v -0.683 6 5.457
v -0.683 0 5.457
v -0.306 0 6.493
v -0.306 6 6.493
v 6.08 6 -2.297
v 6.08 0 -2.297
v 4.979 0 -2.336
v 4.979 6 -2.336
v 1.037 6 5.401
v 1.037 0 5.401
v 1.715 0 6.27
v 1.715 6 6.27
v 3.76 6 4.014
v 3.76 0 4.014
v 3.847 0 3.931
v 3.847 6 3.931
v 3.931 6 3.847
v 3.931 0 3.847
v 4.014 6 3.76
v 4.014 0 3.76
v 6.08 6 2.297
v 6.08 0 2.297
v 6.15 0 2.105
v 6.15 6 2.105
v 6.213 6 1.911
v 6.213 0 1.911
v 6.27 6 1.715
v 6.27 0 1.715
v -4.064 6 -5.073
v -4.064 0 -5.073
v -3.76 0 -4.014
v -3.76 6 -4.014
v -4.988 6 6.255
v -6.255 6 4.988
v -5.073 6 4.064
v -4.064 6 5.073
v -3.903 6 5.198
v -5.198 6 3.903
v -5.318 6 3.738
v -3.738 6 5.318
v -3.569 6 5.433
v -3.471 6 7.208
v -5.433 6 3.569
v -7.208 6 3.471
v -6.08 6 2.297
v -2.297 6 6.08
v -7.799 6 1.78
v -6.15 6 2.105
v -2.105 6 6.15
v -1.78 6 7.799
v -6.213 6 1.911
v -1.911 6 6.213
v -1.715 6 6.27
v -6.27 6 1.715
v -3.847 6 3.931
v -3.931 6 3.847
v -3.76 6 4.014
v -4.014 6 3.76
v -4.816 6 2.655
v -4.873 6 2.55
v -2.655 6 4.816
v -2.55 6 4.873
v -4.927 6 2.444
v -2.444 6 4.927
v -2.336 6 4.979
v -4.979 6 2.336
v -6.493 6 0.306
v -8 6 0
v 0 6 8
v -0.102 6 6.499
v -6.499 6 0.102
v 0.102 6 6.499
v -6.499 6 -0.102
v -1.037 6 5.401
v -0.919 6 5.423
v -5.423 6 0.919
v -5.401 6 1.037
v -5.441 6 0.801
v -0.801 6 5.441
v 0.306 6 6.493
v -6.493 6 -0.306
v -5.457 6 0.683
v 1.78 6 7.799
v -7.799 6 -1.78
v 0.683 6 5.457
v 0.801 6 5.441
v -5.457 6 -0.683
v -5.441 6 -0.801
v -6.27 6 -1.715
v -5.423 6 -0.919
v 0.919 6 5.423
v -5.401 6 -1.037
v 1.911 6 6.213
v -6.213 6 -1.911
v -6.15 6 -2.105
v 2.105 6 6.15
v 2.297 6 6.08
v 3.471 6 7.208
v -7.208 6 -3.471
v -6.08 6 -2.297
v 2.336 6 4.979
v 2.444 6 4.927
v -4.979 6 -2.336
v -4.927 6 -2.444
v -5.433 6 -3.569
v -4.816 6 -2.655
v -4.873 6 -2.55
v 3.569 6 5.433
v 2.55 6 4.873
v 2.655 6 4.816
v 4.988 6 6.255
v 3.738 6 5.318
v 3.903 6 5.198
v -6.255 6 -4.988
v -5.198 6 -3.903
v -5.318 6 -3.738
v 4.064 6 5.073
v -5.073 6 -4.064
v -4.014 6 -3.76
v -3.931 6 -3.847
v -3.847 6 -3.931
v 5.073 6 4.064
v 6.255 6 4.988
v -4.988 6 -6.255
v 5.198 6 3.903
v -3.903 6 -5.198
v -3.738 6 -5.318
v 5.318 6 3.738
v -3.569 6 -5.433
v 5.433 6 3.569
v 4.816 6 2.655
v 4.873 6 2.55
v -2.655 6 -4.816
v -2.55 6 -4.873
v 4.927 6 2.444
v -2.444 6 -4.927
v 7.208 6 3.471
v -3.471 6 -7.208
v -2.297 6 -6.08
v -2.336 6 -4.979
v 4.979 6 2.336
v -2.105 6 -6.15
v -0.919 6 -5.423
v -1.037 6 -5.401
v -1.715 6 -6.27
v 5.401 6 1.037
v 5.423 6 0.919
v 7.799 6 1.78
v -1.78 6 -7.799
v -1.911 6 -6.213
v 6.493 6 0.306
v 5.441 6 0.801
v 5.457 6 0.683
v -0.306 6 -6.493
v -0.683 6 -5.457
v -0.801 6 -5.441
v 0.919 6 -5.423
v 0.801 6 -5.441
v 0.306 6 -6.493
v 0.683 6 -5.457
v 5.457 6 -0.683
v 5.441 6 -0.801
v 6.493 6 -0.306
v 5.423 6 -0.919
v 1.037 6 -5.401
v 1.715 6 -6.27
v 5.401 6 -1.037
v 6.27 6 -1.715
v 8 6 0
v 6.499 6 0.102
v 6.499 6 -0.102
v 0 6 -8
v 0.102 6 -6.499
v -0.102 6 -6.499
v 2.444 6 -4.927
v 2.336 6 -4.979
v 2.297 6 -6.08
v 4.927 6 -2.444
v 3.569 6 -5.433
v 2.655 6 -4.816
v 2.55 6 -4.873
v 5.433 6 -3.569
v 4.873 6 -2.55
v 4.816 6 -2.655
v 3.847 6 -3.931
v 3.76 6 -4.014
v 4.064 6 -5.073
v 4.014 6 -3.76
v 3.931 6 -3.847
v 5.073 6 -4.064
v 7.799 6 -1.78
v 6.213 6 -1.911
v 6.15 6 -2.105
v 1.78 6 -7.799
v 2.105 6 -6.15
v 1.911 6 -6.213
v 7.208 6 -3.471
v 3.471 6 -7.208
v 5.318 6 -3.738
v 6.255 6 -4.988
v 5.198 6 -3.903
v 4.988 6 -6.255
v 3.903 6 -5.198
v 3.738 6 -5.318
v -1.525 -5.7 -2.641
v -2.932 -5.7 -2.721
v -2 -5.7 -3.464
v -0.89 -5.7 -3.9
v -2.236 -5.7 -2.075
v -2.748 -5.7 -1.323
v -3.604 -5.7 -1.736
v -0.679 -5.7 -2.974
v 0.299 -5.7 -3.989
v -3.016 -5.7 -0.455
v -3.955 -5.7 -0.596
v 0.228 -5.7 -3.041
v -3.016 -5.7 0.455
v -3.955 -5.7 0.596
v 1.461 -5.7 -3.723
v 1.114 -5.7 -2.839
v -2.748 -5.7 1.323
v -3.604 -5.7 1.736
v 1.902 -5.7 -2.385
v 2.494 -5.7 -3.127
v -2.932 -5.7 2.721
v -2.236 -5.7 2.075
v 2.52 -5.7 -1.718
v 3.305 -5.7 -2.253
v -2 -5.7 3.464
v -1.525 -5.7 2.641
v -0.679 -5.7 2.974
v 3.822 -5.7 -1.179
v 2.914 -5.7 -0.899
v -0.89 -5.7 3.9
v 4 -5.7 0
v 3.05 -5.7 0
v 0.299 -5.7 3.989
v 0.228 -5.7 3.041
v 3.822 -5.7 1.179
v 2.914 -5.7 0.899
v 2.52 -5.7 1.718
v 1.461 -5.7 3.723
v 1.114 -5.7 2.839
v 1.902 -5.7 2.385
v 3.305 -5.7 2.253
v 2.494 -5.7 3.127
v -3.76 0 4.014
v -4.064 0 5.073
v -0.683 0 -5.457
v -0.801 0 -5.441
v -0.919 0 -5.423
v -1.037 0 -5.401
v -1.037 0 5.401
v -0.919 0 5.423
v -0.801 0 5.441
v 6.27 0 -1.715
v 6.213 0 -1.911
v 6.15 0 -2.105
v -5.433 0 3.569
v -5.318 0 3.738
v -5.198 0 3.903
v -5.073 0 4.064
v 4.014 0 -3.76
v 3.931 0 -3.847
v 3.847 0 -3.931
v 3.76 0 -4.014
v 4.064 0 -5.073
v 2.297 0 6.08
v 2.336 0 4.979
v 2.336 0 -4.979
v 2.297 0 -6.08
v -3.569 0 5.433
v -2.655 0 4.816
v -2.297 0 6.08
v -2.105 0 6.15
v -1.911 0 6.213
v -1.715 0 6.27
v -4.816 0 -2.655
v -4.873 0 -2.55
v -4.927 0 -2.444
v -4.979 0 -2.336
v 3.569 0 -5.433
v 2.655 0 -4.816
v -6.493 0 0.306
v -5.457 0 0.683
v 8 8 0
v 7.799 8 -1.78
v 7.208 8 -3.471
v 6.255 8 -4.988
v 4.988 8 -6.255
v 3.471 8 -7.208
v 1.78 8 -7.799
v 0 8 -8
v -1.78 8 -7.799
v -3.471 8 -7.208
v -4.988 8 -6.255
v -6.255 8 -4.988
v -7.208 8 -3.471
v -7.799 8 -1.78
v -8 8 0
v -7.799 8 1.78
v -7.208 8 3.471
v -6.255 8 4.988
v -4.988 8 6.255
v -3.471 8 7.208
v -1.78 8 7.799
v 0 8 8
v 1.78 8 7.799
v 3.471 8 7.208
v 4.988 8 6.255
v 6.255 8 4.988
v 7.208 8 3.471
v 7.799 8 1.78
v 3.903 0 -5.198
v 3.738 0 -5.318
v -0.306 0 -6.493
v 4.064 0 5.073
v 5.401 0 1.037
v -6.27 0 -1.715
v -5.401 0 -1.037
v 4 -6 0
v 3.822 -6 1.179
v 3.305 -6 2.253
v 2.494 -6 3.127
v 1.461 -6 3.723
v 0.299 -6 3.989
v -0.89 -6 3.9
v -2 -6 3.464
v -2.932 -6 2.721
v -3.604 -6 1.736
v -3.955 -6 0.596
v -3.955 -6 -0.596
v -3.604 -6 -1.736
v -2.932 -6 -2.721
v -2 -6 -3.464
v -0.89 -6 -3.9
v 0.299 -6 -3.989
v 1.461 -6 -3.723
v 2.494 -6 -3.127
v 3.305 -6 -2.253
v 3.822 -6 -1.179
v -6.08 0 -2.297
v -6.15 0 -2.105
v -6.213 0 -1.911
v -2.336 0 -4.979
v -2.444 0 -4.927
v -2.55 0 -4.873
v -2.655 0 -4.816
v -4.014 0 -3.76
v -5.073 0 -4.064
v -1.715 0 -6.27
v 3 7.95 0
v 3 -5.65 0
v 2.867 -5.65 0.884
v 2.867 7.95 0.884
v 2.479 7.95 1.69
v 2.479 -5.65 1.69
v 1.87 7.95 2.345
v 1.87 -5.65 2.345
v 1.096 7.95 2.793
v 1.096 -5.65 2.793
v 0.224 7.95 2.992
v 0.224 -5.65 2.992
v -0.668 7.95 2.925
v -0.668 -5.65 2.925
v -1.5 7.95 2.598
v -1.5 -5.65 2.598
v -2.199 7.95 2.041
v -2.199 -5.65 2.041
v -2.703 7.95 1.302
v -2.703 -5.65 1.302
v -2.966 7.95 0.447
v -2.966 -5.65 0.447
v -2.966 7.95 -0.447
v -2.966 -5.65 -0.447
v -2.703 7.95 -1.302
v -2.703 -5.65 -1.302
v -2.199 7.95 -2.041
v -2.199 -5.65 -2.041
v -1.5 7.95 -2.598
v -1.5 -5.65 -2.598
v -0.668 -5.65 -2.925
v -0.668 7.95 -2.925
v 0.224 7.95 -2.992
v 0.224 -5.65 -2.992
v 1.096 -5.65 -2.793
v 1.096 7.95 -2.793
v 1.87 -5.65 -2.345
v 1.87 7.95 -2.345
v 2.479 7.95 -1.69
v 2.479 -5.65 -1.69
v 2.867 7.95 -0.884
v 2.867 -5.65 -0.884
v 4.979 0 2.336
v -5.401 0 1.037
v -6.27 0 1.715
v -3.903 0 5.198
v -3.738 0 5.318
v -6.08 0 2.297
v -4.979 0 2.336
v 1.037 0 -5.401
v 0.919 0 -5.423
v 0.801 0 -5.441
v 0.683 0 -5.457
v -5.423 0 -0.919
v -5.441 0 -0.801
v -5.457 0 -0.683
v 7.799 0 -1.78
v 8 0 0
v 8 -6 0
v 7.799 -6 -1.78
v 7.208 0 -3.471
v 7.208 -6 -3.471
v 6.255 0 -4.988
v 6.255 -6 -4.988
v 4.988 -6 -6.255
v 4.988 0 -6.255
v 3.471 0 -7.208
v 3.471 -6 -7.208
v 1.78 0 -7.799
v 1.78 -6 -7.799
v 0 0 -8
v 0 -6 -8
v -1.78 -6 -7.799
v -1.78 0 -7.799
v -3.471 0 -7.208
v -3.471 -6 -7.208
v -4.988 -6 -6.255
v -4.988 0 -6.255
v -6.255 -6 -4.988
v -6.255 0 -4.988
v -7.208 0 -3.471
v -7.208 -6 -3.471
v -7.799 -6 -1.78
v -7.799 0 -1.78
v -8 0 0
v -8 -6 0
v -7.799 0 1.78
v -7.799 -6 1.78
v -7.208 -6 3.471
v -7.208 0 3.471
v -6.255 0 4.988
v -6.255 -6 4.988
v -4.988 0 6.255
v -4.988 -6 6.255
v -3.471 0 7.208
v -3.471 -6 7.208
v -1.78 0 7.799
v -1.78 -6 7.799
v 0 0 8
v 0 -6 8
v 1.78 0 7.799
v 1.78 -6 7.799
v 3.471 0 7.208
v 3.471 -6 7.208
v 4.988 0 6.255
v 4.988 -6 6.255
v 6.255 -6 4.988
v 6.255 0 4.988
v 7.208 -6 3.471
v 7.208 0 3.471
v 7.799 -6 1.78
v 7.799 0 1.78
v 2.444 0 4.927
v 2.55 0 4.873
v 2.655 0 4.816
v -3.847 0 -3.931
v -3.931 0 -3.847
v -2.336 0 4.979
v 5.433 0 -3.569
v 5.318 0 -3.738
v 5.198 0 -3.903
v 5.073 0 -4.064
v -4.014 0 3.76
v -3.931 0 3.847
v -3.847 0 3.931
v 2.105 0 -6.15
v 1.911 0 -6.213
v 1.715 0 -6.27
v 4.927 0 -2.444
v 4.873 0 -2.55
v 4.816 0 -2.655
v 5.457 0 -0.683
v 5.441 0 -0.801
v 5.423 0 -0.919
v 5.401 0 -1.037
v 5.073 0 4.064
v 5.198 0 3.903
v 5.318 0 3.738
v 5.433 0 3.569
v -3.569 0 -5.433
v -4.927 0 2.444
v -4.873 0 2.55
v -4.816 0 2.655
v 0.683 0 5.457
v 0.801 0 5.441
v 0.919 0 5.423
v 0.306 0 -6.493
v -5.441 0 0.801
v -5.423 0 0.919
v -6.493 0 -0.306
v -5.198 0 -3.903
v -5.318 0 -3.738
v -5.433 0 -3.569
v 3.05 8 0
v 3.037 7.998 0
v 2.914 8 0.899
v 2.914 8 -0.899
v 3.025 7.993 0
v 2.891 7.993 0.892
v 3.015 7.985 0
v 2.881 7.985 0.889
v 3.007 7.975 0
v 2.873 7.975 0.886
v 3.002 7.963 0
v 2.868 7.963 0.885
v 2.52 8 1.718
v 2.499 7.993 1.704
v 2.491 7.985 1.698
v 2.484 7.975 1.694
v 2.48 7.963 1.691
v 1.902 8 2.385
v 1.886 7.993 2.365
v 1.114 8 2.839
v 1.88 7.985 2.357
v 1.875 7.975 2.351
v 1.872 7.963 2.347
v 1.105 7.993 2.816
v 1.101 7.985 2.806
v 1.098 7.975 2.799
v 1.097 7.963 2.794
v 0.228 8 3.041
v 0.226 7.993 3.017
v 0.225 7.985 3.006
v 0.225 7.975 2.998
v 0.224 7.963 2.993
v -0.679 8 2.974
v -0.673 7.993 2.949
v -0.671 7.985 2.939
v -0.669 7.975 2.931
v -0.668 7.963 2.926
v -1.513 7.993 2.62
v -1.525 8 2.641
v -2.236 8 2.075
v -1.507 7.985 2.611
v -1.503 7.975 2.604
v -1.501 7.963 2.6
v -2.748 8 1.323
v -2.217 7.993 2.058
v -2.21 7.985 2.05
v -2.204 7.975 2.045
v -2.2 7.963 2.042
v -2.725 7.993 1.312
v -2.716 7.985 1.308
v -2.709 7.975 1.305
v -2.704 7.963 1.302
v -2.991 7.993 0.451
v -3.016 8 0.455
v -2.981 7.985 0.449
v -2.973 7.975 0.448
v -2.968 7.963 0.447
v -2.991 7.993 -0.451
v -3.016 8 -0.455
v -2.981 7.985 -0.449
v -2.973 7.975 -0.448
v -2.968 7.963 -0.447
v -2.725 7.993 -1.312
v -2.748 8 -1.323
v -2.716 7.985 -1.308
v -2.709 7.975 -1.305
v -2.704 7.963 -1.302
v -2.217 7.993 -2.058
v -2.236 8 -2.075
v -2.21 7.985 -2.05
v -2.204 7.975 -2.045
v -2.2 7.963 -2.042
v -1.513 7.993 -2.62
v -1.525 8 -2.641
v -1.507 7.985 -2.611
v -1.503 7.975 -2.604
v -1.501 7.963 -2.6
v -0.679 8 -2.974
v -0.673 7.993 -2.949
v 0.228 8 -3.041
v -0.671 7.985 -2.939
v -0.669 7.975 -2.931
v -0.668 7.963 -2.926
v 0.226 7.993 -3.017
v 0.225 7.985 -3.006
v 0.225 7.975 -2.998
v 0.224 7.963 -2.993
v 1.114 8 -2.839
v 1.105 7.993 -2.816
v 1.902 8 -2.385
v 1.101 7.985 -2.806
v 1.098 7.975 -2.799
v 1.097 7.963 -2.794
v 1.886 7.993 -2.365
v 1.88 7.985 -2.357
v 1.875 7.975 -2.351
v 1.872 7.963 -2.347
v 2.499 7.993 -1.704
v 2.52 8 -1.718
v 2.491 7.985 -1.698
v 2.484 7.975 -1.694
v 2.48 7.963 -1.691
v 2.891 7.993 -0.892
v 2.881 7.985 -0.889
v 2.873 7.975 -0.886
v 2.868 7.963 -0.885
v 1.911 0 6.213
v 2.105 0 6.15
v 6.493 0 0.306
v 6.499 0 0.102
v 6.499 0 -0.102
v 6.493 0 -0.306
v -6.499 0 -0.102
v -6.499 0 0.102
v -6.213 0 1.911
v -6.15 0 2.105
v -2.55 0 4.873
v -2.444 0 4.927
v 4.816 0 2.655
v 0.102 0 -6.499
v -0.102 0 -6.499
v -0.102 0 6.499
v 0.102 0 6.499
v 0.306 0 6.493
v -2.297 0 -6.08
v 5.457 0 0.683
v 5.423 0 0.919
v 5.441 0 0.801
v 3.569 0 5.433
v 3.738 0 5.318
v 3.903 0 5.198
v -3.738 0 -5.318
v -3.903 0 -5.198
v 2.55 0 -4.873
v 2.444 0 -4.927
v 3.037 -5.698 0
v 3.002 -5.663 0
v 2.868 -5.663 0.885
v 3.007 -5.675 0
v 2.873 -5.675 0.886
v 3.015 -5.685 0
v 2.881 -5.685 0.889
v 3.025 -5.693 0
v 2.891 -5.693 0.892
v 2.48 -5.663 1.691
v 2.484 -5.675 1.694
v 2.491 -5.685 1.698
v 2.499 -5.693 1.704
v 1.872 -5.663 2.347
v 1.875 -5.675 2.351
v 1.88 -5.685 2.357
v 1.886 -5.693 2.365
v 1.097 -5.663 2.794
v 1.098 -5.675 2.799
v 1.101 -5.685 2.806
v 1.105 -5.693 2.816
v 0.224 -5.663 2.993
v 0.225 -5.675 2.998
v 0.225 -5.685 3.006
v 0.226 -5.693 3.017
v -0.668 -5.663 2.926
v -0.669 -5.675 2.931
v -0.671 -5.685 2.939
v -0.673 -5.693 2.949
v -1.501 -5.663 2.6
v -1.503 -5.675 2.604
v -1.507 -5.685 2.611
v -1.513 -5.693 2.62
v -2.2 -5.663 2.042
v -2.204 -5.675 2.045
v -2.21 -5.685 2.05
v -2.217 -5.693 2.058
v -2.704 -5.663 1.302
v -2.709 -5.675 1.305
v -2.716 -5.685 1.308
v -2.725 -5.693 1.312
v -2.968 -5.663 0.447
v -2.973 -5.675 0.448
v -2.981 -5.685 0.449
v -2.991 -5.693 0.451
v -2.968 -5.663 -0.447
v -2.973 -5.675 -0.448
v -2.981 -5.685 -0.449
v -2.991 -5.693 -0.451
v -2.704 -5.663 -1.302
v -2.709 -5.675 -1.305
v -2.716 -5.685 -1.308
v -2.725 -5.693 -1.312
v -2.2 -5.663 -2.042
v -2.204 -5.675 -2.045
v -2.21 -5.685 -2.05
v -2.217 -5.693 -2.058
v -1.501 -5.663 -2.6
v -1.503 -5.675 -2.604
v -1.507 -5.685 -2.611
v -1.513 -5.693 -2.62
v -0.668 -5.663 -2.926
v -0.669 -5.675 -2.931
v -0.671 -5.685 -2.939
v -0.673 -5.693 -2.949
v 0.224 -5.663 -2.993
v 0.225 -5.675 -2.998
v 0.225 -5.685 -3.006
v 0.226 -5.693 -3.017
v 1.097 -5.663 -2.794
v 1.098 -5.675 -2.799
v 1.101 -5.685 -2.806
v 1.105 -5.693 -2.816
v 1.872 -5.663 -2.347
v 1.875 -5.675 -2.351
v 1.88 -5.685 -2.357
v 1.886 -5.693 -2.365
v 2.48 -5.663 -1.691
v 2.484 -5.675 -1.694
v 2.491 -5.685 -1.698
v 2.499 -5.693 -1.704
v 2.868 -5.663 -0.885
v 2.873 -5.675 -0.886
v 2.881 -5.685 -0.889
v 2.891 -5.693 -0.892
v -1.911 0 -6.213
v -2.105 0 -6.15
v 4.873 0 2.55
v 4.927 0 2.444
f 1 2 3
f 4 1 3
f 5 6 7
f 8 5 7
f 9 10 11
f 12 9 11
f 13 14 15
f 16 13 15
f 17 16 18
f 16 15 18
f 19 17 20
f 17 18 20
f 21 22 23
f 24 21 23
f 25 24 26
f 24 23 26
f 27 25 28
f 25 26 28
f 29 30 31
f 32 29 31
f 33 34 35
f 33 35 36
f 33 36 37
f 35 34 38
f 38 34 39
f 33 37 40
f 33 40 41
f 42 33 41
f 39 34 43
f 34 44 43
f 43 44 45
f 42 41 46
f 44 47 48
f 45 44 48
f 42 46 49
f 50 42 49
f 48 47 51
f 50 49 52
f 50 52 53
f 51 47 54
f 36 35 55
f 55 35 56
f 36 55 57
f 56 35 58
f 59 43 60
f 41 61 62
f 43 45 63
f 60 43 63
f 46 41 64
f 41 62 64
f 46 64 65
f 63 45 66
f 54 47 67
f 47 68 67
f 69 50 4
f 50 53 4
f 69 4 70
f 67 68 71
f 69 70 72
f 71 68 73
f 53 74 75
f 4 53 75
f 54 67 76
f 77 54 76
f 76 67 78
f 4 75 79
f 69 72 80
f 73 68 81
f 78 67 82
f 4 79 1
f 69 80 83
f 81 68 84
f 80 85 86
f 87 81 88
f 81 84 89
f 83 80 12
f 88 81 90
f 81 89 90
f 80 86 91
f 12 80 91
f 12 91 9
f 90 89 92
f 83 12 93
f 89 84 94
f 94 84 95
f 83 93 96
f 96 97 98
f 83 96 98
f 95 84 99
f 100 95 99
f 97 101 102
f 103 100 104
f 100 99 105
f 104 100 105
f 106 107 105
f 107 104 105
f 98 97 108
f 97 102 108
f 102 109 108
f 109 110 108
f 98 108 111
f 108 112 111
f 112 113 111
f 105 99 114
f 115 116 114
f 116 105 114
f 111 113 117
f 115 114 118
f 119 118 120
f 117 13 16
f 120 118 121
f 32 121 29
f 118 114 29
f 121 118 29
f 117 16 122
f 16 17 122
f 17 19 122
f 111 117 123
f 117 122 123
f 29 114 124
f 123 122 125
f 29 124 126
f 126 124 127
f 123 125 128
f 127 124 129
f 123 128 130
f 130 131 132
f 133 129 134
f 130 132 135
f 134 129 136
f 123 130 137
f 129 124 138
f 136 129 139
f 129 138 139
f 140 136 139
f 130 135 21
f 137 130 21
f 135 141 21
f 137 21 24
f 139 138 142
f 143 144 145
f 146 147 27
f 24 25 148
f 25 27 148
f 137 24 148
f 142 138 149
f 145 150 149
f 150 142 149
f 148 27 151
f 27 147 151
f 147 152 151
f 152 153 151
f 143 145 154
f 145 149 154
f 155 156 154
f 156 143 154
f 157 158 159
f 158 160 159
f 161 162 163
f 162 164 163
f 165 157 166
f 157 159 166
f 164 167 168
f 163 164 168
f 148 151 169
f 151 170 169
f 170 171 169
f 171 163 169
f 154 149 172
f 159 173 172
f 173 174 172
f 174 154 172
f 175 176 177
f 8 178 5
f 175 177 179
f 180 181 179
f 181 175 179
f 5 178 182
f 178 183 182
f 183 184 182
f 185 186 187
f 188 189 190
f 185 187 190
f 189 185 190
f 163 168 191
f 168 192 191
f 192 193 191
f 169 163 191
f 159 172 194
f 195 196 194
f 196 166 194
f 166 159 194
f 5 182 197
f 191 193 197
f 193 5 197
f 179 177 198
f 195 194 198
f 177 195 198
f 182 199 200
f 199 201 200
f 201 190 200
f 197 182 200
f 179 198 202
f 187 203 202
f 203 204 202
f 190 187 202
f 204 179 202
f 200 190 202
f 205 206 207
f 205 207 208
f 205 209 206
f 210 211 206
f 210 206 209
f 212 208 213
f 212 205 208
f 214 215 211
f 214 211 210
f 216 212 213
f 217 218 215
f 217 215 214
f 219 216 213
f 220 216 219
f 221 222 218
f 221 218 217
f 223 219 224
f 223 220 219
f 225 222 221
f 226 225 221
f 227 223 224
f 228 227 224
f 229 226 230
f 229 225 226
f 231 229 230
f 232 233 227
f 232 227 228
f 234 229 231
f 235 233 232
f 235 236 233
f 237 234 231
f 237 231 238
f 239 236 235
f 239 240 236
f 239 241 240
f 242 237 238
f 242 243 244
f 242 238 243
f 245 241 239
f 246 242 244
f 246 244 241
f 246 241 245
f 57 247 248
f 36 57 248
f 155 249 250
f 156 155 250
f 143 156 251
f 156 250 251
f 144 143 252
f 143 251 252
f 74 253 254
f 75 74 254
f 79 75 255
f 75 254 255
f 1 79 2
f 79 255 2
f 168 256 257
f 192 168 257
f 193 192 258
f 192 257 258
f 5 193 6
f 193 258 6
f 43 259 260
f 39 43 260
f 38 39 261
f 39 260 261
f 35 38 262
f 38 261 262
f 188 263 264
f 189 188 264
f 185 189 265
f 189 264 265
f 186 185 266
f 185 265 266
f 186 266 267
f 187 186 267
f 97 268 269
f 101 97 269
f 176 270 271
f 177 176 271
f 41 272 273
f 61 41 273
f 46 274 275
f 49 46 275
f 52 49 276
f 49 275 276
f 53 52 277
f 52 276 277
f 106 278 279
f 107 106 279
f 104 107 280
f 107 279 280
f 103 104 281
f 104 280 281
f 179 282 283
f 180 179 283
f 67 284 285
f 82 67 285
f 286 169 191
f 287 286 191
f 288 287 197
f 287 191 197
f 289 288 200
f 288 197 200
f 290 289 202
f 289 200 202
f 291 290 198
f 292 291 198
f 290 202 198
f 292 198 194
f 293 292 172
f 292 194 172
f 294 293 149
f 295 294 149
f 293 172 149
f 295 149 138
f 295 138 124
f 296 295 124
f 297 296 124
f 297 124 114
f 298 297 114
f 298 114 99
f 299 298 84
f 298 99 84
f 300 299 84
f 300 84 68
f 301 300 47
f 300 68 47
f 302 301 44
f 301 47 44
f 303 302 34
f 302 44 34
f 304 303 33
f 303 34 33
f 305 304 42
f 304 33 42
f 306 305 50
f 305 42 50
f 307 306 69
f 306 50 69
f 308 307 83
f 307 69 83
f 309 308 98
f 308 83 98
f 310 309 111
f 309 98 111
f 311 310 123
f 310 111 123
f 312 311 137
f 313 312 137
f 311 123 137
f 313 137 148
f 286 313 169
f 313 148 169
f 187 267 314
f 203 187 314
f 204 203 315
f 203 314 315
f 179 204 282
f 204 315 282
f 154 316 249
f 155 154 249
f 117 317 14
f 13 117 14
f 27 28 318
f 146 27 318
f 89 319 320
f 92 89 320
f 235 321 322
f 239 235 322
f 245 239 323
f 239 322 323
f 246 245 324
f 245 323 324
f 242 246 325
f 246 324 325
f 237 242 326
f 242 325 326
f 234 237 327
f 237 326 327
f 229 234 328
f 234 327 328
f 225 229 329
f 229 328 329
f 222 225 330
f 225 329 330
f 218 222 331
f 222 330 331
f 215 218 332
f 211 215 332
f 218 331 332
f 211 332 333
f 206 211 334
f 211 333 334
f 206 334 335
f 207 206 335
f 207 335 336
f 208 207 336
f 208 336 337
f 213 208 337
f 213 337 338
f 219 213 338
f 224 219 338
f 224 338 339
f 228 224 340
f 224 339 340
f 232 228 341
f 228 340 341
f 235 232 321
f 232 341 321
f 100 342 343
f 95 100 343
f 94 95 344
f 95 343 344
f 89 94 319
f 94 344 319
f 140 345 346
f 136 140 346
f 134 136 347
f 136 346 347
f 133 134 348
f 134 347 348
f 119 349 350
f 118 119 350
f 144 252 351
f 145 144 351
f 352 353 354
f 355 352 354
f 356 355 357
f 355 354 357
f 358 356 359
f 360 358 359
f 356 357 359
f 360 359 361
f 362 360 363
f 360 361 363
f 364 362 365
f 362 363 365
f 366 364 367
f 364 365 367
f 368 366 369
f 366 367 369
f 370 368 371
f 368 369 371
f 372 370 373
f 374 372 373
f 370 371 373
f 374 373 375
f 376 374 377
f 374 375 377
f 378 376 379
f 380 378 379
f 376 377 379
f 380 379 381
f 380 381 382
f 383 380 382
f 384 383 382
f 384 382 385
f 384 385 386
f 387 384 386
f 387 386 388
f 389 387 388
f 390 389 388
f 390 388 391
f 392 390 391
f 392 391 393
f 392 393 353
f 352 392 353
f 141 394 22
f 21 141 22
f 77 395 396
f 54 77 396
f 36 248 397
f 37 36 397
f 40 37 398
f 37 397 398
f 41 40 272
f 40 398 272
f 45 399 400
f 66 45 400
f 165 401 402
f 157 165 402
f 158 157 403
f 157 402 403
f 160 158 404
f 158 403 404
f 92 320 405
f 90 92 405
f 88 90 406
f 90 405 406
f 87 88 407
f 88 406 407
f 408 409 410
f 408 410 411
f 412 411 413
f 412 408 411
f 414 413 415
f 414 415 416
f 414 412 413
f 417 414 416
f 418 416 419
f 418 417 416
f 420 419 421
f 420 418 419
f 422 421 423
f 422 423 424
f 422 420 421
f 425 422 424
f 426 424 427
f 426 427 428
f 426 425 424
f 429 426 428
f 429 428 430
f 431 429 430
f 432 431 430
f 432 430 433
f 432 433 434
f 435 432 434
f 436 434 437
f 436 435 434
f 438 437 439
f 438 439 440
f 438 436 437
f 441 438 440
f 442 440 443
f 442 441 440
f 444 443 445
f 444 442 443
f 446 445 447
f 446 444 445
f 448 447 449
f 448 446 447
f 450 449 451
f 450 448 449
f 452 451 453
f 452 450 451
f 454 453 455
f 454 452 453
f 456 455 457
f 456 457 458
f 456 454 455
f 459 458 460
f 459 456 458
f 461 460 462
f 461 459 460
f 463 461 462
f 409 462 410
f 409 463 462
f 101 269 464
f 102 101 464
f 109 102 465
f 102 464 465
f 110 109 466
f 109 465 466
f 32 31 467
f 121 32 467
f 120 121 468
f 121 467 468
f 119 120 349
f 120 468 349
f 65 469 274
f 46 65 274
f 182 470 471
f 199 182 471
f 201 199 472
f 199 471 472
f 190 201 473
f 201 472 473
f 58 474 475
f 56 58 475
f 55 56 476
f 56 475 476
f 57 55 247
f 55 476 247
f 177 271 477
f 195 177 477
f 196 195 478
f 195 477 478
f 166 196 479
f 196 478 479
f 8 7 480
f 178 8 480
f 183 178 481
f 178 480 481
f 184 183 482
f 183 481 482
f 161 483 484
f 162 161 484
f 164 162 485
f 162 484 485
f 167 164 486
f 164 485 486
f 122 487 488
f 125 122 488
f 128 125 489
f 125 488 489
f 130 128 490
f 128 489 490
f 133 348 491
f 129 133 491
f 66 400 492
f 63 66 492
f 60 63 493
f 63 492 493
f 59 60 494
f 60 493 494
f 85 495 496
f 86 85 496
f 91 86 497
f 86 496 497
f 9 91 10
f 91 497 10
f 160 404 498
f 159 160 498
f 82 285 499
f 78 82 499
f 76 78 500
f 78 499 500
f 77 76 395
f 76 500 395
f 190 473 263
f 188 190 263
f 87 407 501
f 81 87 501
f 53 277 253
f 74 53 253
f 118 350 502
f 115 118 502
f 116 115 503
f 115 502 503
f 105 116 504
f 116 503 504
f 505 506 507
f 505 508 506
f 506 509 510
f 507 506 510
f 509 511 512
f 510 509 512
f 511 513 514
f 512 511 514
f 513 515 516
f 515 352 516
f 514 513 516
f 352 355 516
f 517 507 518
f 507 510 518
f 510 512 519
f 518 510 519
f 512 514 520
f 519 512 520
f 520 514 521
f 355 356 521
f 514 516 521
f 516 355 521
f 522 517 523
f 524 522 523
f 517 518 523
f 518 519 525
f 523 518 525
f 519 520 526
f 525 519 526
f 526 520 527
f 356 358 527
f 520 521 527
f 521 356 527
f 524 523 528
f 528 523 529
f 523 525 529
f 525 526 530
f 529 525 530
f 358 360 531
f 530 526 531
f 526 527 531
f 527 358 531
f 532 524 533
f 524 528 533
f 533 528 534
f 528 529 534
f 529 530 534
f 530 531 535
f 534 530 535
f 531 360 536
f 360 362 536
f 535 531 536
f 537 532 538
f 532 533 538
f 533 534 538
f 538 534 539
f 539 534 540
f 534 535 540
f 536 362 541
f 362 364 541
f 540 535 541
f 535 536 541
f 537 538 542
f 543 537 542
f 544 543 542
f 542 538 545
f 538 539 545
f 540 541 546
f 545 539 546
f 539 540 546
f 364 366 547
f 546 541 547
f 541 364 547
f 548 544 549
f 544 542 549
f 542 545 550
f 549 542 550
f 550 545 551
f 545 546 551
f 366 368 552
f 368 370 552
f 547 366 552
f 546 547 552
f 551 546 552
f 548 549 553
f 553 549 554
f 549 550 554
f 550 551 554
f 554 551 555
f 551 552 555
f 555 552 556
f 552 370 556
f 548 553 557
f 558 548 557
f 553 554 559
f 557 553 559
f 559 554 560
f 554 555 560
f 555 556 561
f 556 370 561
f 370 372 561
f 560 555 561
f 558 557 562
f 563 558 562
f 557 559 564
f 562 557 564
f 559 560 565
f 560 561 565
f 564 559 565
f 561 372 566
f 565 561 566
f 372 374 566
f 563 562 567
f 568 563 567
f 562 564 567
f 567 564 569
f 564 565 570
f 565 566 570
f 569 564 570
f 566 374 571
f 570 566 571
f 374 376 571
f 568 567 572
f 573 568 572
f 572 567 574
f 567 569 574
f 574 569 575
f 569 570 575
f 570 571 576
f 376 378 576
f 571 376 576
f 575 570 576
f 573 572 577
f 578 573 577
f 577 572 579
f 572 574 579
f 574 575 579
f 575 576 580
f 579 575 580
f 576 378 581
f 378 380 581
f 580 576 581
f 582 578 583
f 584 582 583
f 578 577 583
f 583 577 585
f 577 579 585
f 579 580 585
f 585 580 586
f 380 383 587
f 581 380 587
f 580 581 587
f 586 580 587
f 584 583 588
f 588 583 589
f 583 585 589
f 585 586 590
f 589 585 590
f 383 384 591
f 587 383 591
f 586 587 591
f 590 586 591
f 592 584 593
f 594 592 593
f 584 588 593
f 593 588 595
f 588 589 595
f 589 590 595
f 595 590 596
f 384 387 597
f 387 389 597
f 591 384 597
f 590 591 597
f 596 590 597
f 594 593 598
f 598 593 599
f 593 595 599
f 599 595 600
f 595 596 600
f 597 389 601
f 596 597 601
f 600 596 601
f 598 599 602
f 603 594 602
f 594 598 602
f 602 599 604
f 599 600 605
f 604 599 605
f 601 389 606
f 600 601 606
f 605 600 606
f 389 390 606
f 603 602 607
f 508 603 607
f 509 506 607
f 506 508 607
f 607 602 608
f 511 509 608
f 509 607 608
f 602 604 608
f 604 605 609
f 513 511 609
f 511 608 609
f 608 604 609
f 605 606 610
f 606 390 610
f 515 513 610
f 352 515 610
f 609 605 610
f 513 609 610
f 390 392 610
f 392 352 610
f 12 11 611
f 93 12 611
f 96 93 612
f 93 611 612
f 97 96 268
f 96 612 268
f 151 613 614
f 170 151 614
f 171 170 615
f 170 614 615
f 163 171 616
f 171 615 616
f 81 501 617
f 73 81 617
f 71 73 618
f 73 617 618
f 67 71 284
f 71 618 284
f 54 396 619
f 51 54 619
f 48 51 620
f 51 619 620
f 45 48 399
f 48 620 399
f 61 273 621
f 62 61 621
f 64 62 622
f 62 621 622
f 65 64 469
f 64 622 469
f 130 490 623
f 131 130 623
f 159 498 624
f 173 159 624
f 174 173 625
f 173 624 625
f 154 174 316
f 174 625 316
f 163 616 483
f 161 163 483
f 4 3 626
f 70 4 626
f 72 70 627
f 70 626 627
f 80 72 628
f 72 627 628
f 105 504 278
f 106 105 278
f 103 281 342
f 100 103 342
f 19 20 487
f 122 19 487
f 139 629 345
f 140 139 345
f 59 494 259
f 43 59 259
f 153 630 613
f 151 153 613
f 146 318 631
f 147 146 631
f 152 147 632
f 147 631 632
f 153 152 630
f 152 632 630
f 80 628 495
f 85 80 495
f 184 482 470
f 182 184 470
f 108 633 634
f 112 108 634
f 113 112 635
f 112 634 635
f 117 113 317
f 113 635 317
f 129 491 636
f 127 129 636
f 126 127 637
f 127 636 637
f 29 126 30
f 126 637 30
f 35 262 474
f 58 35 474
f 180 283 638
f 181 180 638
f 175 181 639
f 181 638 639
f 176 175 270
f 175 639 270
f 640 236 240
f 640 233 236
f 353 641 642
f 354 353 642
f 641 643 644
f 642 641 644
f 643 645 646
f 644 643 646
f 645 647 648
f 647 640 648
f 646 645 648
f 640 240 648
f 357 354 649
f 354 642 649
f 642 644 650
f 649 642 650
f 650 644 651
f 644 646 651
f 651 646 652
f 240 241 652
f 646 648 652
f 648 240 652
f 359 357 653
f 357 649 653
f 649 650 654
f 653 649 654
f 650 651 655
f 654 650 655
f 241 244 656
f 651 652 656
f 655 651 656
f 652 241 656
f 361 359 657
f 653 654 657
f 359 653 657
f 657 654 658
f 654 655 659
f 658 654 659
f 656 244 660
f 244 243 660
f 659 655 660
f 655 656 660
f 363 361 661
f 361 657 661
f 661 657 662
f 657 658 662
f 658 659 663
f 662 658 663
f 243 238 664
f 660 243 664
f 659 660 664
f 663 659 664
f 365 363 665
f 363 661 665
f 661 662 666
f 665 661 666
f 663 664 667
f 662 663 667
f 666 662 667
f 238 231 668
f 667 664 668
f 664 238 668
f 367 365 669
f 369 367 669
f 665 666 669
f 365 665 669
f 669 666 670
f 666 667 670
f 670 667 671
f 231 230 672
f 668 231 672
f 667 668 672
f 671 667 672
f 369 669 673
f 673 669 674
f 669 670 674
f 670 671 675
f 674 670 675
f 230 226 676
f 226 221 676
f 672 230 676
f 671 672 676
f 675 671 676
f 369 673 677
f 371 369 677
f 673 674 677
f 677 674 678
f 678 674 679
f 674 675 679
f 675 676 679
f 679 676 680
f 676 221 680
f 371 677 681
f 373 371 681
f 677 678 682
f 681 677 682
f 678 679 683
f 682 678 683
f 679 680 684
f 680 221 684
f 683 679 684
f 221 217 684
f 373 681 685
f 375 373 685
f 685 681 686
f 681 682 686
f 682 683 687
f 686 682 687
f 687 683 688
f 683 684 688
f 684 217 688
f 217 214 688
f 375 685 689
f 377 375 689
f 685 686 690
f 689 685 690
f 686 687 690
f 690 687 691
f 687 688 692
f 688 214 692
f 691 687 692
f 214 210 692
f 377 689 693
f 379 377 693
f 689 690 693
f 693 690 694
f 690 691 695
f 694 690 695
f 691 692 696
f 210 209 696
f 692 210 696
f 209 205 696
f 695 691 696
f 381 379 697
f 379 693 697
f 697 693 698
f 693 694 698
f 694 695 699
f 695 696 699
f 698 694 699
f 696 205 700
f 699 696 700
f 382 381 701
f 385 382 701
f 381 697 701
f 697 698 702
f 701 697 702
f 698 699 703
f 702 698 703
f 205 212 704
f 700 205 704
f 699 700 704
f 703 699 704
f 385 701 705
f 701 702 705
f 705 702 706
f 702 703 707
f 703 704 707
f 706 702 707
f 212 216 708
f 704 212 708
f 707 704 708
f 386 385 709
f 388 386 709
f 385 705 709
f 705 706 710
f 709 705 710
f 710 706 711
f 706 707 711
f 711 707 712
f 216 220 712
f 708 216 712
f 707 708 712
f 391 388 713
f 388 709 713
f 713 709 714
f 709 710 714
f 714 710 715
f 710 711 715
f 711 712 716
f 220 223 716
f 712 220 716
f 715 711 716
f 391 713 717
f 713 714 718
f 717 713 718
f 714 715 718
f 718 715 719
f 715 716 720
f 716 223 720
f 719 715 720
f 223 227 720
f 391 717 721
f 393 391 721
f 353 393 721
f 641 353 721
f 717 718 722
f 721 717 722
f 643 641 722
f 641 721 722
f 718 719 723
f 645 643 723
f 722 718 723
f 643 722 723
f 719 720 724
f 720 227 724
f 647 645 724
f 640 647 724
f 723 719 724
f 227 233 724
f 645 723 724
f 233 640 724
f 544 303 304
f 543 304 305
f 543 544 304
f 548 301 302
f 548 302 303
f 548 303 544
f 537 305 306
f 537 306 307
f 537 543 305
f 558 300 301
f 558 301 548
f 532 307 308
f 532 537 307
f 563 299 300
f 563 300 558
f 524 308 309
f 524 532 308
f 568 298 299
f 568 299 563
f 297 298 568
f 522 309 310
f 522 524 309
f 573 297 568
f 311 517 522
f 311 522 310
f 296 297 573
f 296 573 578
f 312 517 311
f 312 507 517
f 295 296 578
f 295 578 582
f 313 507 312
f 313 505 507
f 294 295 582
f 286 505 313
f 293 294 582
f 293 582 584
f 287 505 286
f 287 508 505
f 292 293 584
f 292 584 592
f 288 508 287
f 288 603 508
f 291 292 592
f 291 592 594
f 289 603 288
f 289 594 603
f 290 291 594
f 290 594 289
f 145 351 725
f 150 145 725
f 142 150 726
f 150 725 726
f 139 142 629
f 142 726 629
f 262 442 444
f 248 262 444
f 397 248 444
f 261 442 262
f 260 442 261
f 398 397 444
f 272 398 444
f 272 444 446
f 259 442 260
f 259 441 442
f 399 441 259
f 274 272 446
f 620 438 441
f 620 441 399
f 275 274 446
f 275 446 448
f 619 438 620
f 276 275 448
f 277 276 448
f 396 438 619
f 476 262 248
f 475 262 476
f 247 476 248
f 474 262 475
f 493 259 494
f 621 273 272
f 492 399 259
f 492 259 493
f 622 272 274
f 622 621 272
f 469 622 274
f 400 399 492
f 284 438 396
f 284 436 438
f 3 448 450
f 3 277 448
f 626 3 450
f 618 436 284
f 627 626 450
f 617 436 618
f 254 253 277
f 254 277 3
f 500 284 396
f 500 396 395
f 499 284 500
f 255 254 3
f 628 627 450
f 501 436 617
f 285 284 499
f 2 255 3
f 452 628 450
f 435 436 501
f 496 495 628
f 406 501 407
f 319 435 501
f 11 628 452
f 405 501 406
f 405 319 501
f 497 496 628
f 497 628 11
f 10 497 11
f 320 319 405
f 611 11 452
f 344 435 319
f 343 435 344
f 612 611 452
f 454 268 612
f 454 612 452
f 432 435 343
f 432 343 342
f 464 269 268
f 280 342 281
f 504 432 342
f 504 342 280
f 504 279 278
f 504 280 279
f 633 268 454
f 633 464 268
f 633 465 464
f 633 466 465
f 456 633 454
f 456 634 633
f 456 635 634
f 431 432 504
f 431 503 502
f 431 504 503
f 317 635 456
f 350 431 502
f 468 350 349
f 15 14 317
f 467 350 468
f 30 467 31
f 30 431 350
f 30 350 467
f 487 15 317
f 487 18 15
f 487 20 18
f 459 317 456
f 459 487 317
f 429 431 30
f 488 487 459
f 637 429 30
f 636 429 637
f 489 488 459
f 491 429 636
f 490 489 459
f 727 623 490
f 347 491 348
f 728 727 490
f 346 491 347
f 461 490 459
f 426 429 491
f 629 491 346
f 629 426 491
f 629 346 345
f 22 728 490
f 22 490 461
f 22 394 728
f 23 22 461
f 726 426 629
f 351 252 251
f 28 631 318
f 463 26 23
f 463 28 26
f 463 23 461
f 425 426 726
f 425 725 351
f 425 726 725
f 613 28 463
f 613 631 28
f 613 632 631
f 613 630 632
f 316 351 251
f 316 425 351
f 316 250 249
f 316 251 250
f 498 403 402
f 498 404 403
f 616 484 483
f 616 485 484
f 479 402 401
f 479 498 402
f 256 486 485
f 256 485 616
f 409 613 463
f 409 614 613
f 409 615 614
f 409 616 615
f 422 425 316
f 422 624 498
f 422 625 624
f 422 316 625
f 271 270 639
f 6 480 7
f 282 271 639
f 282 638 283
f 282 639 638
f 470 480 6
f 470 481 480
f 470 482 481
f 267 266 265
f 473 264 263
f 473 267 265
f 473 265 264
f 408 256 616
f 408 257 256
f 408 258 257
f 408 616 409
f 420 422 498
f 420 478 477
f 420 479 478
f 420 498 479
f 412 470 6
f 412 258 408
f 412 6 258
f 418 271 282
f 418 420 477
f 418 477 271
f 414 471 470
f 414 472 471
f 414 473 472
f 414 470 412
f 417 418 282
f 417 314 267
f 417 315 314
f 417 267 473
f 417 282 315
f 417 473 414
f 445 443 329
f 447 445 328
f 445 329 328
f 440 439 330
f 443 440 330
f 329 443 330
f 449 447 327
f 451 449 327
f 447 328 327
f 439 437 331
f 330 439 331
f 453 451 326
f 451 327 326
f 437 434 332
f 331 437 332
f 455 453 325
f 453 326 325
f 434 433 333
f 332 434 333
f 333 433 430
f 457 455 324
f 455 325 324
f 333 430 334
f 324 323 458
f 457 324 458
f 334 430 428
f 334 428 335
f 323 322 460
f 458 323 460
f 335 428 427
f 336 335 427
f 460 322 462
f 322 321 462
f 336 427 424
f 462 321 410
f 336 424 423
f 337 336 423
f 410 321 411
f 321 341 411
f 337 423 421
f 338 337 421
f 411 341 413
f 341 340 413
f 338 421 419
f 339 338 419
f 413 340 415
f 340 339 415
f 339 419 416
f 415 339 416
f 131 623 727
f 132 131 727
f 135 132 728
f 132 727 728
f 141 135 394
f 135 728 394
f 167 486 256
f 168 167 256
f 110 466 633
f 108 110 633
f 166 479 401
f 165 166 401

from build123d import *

# Parameters (mm, degrees)
SKETCH1_R           = 8
BOSS_EXTRUDE1_DEPTH = 6
BOSS_EXTRUDE2_DEPTH = 6
SKETCH3_R           = 8
BOSS_EXTRUDE3_DEPTH = 2
SKETCH4_R           = 3
CUT_EXTRUDE1_DEPTH  = 15
SKETCH5_R           = 4
CUT_EXTRUDE2_DEPTH  = 0.3
FILLET1_R           = 0.05


with BuildPart() as part:
    # Sketch1 → Boss-Extrude1 (new body)
    with BuildSketch(Plane(origin=(0, 0, 0), x_dir=(1, 0, 0), z_dir=(0, 1, 0))):
        Circle(SKETCH1_R)
    extrude(amount=-BOSS_EXTRUDE1_DEPTH)

    # Sketch2 → Boss-Extrude2 (add)
    with BuildSketch(Plane(origin=(0, 0, 0), x_dir=(1, 0, 0), z_dir=(0, 1, 0))):
        with BuildLine():
            Line((-0.305930382, 6.492796516), (-0.682763233, 5.457456767))
            ThreePointArc((-0.682763233, 5.457456767), (-0.860389558, 5.432285873), (-1.037100465, 5.401335263))
            Line((-1.037100465, 5.401335263), (-1.715427381, 6.269554123))
            ThreePointArc((-1.715427381, 6.269554123), (-2.008610463, 6.181867356), (-2.297341548, 6.080478749))
            Line((-2.297341548, 6.080478749), (-2.335793309, 4.979364379))
            ThreePointArc((-2.335793309, 4.979364379), (-2.496947749, 4.900535883), (-2.655445544, 4.81649343))
            Line((-2.655445544, 4.81649343), (-3.56886716, 5.43260409))
            ThreePointArc((-3.56886716, 5.43260409), (-3.82060414, 5.258610463), (-4.063872917, 5.072961356))
            Line((-4.063872917, 5.072961356), (-3.760179662, 4.013857112))
            ThreePointArc((-3.760179662, 4.013857112), (-3.889087297, 3.889087297), (-4.013857112, 3.760179662))
            Line((-4.013857112, 3.760179662), (-5.072961356, 4.063872917))
            ThreePointArc((-5.072961356, 4.063872917), (-5.258610463, 3.82060414), (-5.43260409, 3.56886716))
            Line((-5.43260409, 3.56886716), (-4.81649343, 2.655445544))
            ThreePointArc((-4.81649343, 2.655445544), (-4.900535883, 2.496947749), (-4.979364379, 2.335793309))
            Line((-4.979364379, 2.335793309), (-6.080478749, 2.297341548))
            ThreePointArc((-6.080478749, 2.297341548), (-6.181867356, 2.008610463), (-6.269554123, 1.715427381))
            Line((-6.269554123, 1.715427381), (-5.401335263, 1.037100465))
            ThreePointArc((-5.401335263, 1.037100465), (-5.432285873, 0.860389558), (-5.457456767, 0.682763233))
            Line((-5.457456767, 0.682763233), (-6.492796516, 0.305930382))
            ThreePointArc((-6.492796516, 0.305930382), (-6.5, 0), (-6.492796516, -0.305930382))
            Line((-6.492796516, -0.305930382), (-5.457456767, -0.682763233))
            ThreePointArc((-5.457456767, -0.682763233), (-5.432285873, -0.860389558), (-5.401335263, -1.037100465))
            Line((-5.401335263, -1.037100465), (-6.269554123, -1.715427381))
            ThreePointArc((-6.269554123, -1.715427381), (-6.181867356, -2.008610463), (-6.080478749, -2.297341548))
            Line((-6.080478749, -2.297341548), (-4.979364379, -2.335793309))
            ThreePointArc((-4.979364379, -2.335793309), (-4.900535883, -2.496947749), (-4.81649343, -2.655445544))
            Line((-4.81649343, -2.655445544), (-5.43260409, -3.56886716))
            ThreePointArc((-5.43260409, -3.56886716), (-5.258610463, -3.82060414), (-5.072961356, -4.063872917))
            Line((-5.072961356, -4.063872917), (-4.013857112, -3.760179662))
            ThreePointArc((-4.013857112, -3.760179662), (-3.889087297, -3.889087297), (-3.760179662, -4.013857112))
            Line((-3.760179662, -4.013857112), (-4.063872917, -5.072961356))
            ThreePointArc((-4.063872917, -5.072961356), (-3.82060414, -5.258610463), (-3.56886716, -5.43260409))
            Line((-3.56886716, -5.43260409), (-2.655445544, -4.81649343))
            ThreePointArc((-2.655445544, -4.81649343), (-2.496947749, -4.900535883), (-2.335793309, -4.979364379))
            Line((-2.335793309, -4.979364379), (-2.297341548, -6.080478749))
            ThreePointArc((-2.297341548, -6.080478749), (-2.008610463, -6.181867356), (-1.715427381, -6.269554123))
            Line((-1.715427381, -6.269554123), (-1.037100465, -5.401335263))
            ThreePointArc((-1.037100465, -5.401335263), (-0.860389558, -5.432285873), (-0.682763233, -5.457456767))
            Line((-0.682763233, -5.457456767), (-0.305930382, -6.492796516))
            ThreePointArc((-0.305930382, -6.492796516), (0, -6.5), (0.305930382, -6.492796516))
            Line((0.305930382, -6.492796516), (0.682763233, -5.457456767))
            ThreePointArc((0.682763233, -5.457456767), (0.860389558, -5.432285873), (1.037100465, -5.401335263))
            Line((1.037100465, -5.401335263), (1.715427381, -6.269554123))
            ThreePointArc((1.715427381, -6.269554123), (2.008610463, -6.181867356), (2.297341548, -6.080478749))
            Line((2.297341548, -6.080478749), (2.335793309, -4.979364379))
            ThreePointArc((2.335793309, -4.979364379), (2.496947749, -4.900535883), (2.655445544, -4.81649343))
            Line((2.655445544, -4.81649343), (3.56886716, -5.43260409))
            ThreePointArc((3.56886716, -5.43260409), (3.82060414, -5.258610463), (4.063872917, -5.072961356))
            Line((4.063872917, -5.072961356), (3.760179662, -4.013857112))
            ThreePointArc((3.760179662, -4.013857112), (3.889087297, -3.889087297), (4.013857112, -3.760179662))
            Line((4.013857112, -3.760179662), (5.072961356, -4.063872917))
            ThreePointArc((5.072961356, -4.063872917), (5.258610463, -3.82060414), (5.43260409, -3.56886716))
            Line((5.43260409, -3.56886716), (4.81649343, -2.655445544))
            ThreePointArc((4.81649343, -2.655445544), (4.900535883, -2.496947749), (4.979364379, -2.335793309))
            Line((4.979364379, -2.335793309), (6.080478749, -2.297341548))
            ThreePointArc((6.080478749, -2.297341548), (6.181867356, -2.008610463), (6.269554123, -1.715427381))
            Line((6.269554123, -1.715427381), (5.401335263, -1.037100465))
            ThreePointArc((5.401335263, -1.037100465), (5.432285873, -0.860389558), (5.457456767, -0.682763233))
            Line((5.457456767, -0.682763233), (6.492796516, -0.305930382))
            ThreePointArc((6.492796516, -0.305930382), (6.5, 0), (6.492796516, 0.305930382))
            Line((6.492796516, 0.305930382), (5.457456767, 0.682763233))
            ThreePointArc((5.457456767, 0.682763233), (5.432285873, 0.860389558), (5.401335263, 1.037100465))
            Line((5.401335263, 1.037100465), (6.269554123, 1.715427381))
            ThreePointArc((6.269554123, 1.715427381), (6.181867356, 2.008610463), (6.080478749, 2.297341548))
            Line((6.080478749, 2.297341548), (4.979364379, 2.335793309))
            ThreePointArc((4.979364379, 2.335793309), (4.900535883, 2.496947749), (4.81649343, 2.655445544))
            Line((4.81649343, 2.655445544), (5.43260409, 3.56886716))
            ThreePointArc((5.43260409, 3.56886716), (5.258610463, 3.82060414), (5.072961356, 4.063872917))
            Line((5.072961356, 4.063872917), (4.013857112, 3.760179662))
            ThreePointArc((4.013857112, 3.760179662), (3.889087297, 3.889087297), (3.760179662, 4.013857112))
            Line((3.760179662, 4.013857112), (4.063872917, 5.072961356))
            ThreePointArc((4.063872917, 5.072961356), (3.82060414, 5.258610463), (3.56886716, 5.43260409))
            Line((3.56886716, 5.43260409), (2.655445544, 4.81649343))
            ThreePointArc((2.655445544, 4.81649343), (2.496947749, 4.900535883), (2.335793309, 4.979364379))
            Line((2.335793309, 4.979364379), (2.297341548, 6.080478749))
            ThreePointArc((2.297341548, 6.080478749), (2.008610463, 6.181867356), (1.715427381, 6.269554123))
            Line((1.715427381, 6.269554123), (1.037100465, 5.401335263))
            ThreePointArc((1.037100465, 5.401335263), (0.860389558, 5.432285873), (0.682763233, 5.457456767))
            Line((0.682763233, 5.457456767), (0.305930382, 6.492796516))
            ThreePointArc((0.305930382, 6.492796516), (0, 6.5), (-0.305930382, 6.492796516))
        make_face()
    extrude(amount=BOSS_EXTRUDE2_DEPTH)

    # Sketch3 → Boss-Extrude3 (add)
    with BuildSketch(Plane(origin=(0, 6, 0), x_dir=(1, 0, 0), z_dir=(0, 1, 0))):
        Circle(SKETCH3_R)
    extrude(amount=BOSS_EXTRUDE3_DEPTH)

    # Sketch4 → Cut-Extrude1 (cut, through all)
    with BuildSketch(Plane.XZ.offset(6)):
        Circle(SKETCH4_R)
    extrude(amount=-CUT_EXTRUDE1_DEPTH, mode=Mode.SUBTRACT)

    # Sketch5 → Cut-Extrude2 (cut)
    with BuildSketch(Plane.XZ.offset(6)):
        Circle(SKETCH5_R)
    extrude(amount=-CUT_EXTRUDE2_DEPTH, mode=Mode.SUBTRACT)

    # Fillet1
    fillet1_edges = [part.edges().sort_by_distance(p)[0] for p in [
        (-3, 8, 0),
        (-3, -5.7, 0),
    ]]
    fillet(fillet1_edges, radius=FILLET1_R)


solid = part.part
